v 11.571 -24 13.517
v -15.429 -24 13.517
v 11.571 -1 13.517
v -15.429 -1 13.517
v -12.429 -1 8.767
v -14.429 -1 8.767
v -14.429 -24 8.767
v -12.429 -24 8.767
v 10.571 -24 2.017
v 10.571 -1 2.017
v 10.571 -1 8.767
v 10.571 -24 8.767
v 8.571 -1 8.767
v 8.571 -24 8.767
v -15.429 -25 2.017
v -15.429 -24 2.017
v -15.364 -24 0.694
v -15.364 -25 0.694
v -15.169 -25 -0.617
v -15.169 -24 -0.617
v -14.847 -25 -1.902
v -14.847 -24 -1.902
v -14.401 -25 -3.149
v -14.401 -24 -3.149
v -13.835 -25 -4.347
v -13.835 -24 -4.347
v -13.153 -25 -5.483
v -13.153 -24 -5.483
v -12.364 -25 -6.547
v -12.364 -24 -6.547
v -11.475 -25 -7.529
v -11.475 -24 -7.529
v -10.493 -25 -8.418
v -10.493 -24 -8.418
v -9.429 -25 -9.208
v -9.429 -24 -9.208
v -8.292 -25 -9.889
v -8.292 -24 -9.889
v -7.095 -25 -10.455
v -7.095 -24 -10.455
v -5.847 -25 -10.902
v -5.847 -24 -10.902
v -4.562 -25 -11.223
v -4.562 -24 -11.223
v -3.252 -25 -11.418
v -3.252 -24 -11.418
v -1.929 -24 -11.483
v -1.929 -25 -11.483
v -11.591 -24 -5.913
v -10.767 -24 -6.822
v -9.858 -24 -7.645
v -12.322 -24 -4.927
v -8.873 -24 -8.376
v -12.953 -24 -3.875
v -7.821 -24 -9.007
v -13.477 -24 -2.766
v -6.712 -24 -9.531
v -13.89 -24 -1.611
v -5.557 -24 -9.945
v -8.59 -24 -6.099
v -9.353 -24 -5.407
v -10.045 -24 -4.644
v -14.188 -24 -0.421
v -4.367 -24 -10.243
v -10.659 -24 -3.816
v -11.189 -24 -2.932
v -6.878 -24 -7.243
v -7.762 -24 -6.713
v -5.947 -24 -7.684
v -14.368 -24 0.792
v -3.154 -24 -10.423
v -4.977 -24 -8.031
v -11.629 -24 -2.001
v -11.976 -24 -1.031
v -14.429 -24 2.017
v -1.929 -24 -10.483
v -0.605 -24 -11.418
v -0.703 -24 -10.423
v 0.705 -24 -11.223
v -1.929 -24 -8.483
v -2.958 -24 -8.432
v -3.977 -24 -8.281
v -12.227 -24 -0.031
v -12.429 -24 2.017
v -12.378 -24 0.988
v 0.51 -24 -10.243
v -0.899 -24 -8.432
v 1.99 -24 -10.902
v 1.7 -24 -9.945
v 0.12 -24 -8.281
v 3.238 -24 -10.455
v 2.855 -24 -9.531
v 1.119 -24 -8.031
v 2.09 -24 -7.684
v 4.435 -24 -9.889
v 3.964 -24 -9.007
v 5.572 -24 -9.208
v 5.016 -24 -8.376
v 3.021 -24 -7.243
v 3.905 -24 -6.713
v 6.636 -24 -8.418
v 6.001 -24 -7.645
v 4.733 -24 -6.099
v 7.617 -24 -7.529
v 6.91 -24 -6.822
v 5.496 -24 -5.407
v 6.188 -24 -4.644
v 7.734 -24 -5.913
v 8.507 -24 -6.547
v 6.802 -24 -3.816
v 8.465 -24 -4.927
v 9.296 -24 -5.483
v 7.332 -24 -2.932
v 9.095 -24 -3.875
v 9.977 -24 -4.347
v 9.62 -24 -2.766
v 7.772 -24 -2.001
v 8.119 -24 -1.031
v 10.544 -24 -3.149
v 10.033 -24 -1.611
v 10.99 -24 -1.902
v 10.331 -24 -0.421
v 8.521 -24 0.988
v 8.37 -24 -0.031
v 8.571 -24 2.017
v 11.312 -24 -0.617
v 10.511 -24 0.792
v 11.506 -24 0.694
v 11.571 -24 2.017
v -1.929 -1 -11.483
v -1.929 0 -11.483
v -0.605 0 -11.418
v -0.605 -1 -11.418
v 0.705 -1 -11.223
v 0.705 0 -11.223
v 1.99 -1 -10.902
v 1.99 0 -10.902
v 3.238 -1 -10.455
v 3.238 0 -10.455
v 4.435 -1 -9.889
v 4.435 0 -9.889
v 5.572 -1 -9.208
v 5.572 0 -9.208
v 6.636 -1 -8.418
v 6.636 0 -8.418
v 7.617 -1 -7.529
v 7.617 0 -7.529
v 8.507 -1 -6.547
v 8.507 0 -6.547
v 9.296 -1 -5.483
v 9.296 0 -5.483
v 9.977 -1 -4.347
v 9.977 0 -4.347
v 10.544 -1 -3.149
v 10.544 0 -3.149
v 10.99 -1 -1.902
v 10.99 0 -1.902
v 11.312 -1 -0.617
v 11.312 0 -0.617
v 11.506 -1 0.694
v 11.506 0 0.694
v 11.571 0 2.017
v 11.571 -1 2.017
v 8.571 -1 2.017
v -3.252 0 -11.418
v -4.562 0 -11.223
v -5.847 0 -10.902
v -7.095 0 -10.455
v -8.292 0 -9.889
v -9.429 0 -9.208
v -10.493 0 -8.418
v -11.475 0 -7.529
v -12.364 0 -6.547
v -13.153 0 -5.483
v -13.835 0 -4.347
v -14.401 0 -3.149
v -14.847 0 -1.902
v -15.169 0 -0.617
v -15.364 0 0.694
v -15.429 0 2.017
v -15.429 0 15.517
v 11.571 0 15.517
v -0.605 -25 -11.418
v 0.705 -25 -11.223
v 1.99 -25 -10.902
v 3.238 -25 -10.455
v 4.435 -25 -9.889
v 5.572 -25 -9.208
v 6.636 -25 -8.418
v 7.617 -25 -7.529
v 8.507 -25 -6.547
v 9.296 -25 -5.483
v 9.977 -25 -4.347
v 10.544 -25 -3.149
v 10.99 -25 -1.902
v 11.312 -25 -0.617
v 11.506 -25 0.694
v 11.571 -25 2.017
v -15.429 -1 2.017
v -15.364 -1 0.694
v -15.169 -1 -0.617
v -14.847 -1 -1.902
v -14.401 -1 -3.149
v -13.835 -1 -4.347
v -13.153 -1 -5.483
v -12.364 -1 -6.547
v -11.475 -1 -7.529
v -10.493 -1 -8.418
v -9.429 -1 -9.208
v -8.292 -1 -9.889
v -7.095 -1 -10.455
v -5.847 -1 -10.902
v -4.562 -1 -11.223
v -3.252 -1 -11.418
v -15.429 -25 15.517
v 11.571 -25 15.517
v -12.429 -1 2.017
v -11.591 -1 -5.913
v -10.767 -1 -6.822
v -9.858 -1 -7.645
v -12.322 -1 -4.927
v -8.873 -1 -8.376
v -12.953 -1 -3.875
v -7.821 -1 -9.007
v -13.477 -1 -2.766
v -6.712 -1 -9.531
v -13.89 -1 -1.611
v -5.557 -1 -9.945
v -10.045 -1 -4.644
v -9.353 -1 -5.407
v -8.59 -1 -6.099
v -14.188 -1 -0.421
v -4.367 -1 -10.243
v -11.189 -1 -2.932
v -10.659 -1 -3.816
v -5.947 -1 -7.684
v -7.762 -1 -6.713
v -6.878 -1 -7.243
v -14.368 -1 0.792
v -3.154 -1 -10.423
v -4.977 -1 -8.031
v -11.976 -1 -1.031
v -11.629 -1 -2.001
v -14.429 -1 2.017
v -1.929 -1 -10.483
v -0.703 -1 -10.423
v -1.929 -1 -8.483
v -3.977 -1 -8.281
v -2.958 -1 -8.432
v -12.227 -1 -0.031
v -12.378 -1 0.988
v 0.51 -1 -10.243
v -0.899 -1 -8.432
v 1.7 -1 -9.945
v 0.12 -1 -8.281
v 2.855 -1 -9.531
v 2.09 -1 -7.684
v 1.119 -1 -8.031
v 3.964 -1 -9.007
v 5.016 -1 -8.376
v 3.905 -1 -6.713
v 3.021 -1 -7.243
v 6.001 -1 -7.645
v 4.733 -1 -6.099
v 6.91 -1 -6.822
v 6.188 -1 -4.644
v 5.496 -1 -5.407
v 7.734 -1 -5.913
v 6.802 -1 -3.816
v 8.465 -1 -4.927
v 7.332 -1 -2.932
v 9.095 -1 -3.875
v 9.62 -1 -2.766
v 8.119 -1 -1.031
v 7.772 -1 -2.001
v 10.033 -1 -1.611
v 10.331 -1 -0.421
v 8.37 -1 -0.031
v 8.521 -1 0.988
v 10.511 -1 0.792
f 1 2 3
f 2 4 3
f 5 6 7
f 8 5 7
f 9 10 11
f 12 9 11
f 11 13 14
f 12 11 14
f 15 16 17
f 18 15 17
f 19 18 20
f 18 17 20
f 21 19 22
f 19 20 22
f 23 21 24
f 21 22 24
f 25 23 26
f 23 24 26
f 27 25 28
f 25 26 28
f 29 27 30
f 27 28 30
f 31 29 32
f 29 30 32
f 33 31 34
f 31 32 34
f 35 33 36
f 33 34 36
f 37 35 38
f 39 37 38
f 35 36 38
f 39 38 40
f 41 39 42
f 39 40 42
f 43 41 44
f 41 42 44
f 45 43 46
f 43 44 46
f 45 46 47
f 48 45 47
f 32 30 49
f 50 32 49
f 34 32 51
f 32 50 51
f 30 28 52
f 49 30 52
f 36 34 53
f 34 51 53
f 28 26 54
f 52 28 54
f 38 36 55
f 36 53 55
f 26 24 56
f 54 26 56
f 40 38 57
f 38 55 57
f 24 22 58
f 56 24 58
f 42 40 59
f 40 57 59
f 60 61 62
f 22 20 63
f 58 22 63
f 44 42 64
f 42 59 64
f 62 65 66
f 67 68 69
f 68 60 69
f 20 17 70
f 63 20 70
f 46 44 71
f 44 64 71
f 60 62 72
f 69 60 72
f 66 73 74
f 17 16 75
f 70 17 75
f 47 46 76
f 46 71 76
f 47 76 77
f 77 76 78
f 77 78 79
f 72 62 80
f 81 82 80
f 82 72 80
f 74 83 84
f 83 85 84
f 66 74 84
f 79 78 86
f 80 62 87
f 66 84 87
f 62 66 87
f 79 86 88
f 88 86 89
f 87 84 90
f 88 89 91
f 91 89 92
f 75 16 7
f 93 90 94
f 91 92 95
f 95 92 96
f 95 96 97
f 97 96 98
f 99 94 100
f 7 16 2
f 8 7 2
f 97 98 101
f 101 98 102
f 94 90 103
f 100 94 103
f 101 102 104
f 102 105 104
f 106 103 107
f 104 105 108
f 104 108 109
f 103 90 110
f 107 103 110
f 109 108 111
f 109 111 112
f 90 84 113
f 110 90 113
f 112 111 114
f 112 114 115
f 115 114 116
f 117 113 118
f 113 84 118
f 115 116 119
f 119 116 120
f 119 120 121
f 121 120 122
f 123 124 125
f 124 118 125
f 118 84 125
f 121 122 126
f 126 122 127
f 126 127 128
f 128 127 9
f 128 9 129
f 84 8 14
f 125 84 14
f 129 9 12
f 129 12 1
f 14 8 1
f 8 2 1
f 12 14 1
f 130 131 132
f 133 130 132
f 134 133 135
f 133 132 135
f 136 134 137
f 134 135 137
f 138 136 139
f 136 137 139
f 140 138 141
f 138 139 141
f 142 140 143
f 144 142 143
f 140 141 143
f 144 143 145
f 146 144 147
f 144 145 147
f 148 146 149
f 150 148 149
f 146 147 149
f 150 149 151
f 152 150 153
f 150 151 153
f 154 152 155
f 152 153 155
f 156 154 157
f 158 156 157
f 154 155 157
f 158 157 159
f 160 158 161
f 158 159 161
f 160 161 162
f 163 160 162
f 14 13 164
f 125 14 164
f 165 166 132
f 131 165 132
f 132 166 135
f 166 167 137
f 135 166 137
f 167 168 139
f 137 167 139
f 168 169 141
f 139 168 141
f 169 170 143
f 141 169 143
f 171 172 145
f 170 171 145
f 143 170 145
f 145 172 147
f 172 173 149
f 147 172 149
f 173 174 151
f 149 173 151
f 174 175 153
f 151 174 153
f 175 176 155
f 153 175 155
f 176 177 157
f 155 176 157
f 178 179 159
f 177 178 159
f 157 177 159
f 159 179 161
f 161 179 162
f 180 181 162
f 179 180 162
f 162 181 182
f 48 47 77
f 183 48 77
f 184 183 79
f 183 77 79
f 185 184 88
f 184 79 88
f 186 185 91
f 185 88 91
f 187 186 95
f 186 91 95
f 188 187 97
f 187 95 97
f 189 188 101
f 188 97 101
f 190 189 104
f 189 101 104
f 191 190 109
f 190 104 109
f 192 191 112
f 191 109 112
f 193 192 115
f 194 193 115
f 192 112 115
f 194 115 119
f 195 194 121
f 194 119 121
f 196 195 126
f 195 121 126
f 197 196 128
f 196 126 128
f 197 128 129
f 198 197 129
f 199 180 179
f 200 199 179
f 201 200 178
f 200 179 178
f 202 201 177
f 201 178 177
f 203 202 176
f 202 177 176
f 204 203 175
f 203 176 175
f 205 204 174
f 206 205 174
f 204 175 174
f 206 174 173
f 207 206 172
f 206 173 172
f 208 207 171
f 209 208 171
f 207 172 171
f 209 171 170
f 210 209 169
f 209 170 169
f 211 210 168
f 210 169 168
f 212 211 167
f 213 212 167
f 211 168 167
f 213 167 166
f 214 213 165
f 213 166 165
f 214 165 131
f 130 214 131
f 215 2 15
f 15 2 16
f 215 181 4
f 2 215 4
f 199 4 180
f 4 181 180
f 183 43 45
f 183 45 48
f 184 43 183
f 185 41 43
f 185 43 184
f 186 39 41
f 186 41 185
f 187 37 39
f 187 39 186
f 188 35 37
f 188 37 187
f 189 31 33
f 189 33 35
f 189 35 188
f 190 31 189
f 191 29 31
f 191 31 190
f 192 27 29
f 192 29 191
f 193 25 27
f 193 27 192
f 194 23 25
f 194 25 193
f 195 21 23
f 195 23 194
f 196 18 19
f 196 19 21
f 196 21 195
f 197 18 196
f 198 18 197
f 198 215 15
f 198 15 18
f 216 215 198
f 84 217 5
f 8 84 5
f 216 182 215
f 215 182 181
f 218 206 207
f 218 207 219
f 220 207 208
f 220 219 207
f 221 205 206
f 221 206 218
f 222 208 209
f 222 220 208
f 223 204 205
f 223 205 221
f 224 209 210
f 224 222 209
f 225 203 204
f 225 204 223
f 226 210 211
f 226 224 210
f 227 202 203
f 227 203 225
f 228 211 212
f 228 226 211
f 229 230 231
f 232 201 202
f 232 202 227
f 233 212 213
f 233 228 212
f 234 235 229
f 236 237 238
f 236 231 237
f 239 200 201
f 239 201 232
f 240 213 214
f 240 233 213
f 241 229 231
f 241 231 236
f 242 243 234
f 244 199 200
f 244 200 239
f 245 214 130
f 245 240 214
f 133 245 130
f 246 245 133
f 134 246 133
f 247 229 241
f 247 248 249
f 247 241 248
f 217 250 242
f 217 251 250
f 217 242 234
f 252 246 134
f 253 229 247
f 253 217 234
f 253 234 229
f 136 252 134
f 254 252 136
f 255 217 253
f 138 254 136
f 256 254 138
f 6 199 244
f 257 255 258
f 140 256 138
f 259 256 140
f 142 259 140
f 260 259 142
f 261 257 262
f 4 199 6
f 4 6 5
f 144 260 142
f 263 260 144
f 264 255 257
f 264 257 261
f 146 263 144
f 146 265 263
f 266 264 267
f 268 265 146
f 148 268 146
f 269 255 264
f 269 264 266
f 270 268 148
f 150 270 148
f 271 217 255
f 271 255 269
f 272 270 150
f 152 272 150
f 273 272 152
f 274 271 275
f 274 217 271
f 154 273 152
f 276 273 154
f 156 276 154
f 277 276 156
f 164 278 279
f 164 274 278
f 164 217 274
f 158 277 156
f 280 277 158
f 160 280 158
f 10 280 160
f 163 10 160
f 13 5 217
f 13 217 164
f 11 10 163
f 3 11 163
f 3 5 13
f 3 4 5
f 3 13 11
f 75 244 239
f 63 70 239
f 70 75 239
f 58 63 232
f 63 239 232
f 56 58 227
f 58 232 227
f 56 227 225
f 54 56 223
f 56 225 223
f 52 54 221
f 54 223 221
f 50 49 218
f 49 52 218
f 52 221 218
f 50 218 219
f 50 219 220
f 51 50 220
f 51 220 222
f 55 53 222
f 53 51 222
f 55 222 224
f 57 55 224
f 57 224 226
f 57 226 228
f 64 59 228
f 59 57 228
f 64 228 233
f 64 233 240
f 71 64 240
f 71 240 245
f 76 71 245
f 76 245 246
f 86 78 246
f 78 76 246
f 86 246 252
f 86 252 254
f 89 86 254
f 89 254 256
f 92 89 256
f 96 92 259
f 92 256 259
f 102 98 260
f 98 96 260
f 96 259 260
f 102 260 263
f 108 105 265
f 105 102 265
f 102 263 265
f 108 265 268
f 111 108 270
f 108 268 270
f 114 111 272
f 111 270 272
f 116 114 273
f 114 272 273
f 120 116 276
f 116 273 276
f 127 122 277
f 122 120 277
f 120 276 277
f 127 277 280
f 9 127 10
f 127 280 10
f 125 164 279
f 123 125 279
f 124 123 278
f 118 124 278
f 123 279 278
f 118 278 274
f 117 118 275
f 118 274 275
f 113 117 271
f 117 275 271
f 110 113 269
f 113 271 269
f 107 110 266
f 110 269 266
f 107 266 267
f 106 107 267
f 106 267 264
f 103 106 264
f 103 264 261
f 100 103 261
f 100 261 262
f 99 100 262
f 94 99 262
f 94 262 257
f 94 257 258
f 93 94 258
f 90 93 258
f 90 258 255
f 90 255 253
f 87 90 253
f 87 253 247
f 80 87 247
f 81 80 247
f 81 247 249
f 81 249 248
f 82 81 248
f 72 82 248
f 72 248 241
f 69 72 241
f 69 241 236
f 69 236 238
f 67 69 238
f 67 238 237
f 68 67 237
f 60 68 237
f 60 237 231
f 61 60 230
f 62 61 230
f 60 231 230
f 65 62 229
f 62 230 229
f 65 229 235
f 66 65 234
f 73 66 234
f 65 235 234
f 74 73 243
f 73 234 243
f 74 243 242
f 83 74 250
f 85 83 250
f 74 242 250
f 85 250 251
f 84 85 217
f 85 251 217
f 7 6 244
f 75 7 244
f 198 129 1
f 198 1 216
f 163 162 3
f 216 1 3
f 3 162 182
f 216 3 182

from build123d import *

# Parameters (mm, degrees)
F0_W     = 2
F0_H     = 2
F0_W_2   = 1
F0_W_3   = 21
F1_DEPTH = 25
F2_DEPTH = 1
F3_START = 24
F3_DEPTH = 1
F4_W     = 23
F4_H     = 4.75
F5_DEPTH = 25


with BuildPart() as f1:
    # F0 (on Front) → F1 (new body)
    with BuildSketch(Plane.XZ):
        with BuildLine():
            Line((-12.4285714286, 13.5171716937), (-14.4285714286, 13.5171716937))
            Line((-14.4285714286, 13.5171716937), (-14.4285714286, 2.0171716937))
            ThreePointArc((-14.4285714286, 2.0171716937), (-1.9285714286, -10.4828283063), (10.5714285714, 2.0171716937))
            Line((10.5714285714, 2.0171716937), (10.5714285714, 13.5171716937))
            Line((10.5714285714, 13.5171716937), (8.5714285714, 13.5171716937))
            Line((8.5714285714, 13.5171716937), (8.5714285714, 2.0171716937))
            ThreePointArc((8.5714285714, 2.0171716937), (-1.9285714286, -8.4828283063), (-12.4285714286, 2.0171716937))
            Line((-12.4285714286, 2.0171716937), (-12.4285714286, 13.5171716937))
        make_face()
        with Locations((9.5714285714, 14.5171716937)):
            Rectangle(F0_W, F0_H)
        with Locations((-13.4285714286, 14.5171716937)):
            Rectangle(F0_W, F0_H)
        with Locations((-14.9285714286, 14.5171716937)):
            Rectangle(F0_W_2, F0_H)
        with Locations((-1.9285714286, 14.5171716937)):
            Rectangle(F0_W_3, F0_H)
        with Locations((11.0714285714, 14.5171716937)):
            Rectangle(F0_W_2, F0_H)
    extrude(amount=F1_DEPTH)

    # F0 (on Front) → F2 (join)
    with BuildSketch(Plane.XZ):
        with BuildLine():
            Line((-14.4285714286, 13.5171716937), (-15.4285714286, 13.5171716937))
            Line((-15.4285714286, 13.5171716937), (-15.4285714286, 2.0171716937))
            ThreePointArc((-15.4285714286, 2.0171716937), (-11.4745129746, -7.5287698523), (-1.9285714286, -11.4828283063))
            ThreePointArc((-1.9285714286, -11.4828283063), (7.6173701174, -7.5287698523), (11.5714285714, 2.0171716937))
            Line((11.5714285714, 2.0171716937), (11.5714285714, 13.5171716937))
            Line((11.5714285714, 13.5171716937), (10.5714285714, 13.5171716937))
            Line((10.5714285714, 13.5171716937), (10.5714285714, 2.0171716937))
            ThreePointArc((10.5714285714, 2.0171716937), (-1.9285714286, -10.4828283063), (-14.4285714286, 2.0171716937))
            Line((-14.4285714286, 2.0171716937), (-14.4285714286, 13.5171716937))
        make_face()
        with BuildLine():
            Line((-12.4285714286, 13.5171716937), (-14.4285714286, 13.5171716937))
            Line((-14.4285714286, 13.5171716937), (-14.4285714286, 2.0171716937))
            ThreePointArc((-14.4285714286, 2.0171716937), (-1.9285714286, -10.4828283063), (10.5714285714, 2.0171716937))
            Line((10.5714285714, 2.0171716937), (10.5714285714, 13.5171716937))
            Line((10.5714285714, 13.5171716937), (8.5714285714, 13.5171716937))
            Line((8.5714285714, 13.5171716937), (8.5714285714, 2.0171716937))
            ThreePointArc((8.5714285714, 2.0171716937), (-1.9285714286, -8.4828283063), (-12.4285714286, 2.0171716937))
            Line((-12.4285714286, 2.0171716937), (-12.4285714286, 13.5171716937))
        make_face()
        with BuildLine():
            Line((8.5714285714, 13.5171716937), (-12.4285714286, 13.5171716937))
            Line((-12.4285714286, 13.5171716937), (-12.4285714286, 2.0171716937))
            ThreePointArc((-12.4285714286, 2.0171716937), (-1.9285714286, -8.4828283063), (8.5714285714, 2.0171716937))
            Line((8.5714285714, 2.0171716937), (8.5714285714, 13.5171716937))
        make_face()
    extrude(amount=F2_DEPTH)

    # F0 (on Front) → F3 (join)
    with BuildSketch(Plane.XZ.offset(F3_START)):
        with BuildLine():
            Line((-14.4285714286, 13.5171716937), (-15.4285714286, 13.5171716937))
            Line((-15.4285714286, 13.5171716937), (-15.4285714286, 2.0171716937))
            ThreePointArc((-15.4285714286, 2.0171716937), (-11.4745129746, -7.5287698523), (-1.9285714286, -11.4828283063))
            ThreePointArc((-1.9285714286, -11.4828283063), (7.6173701174, -7.5287698523), (11.5714285714, 2.0171716937))
            Line((11.5714285714, 2.0171716937), (11.5714285714, 13.5171716937))
            Line((11.5714285714, 13.5171716937), (10.5714285714, 13.5171716937))
            Line((10.5714285714, 13.5171716937), (10.5714285714, 2.0171716937))
            ThreePointArc((10.5714285714, 2.0171716937), (-1.9285714286, -10.4828283063), (-14.4285714286, 2.0171716937))
            Line((-14.4285714286, 2.0171716937), (-14.4285714286, 13.5171716937))
        make_face()
        with BuildLine():
            Line((-12.4285714286, 13.5171716937), (-14.4285714286, 13.5171716937))
            Line((-14.4285714286, 13.5171716937), (-14.4285714286, 2.0171716937))
            ThreePointArc((-14.4285714286, 2.0171716937), (-1.9285714286, -10.4828283063), (10.5714285714, 2.0171716937))
            Line((10.5714285714, 2.0171716937), (10.5714285714, 13.5171716937))
            Line((10.5714285714, 13.5171716937), (8.5714285714, 13.5171716937))
            Line((8.5714285714, 13.5171716937), (8.5714285714, 2.0171716937))
            ThreePointArc((8.5714285714, 2.0171716937), (-1.9285714286, -8.4828283063), (-12.4285714286, 2.0171716937))
            Line((-12.4285714286, 2.0171716937), (-12.4285714286, 13.5171716937))
        make_face()
        with BuildLine():
            Line((8.5714285714, 13.5171716937), (-12.4285714286, 13.5171716937))
            Line((-12.4285714286, 13.5171716937), (-12.4285714286, 2.0171716937))
            ThreePointArc((-12.4285714286, 2.0171716937), (-1.9285714286, -8.4828283063), (8.5714285714, 2.0171716937))
            Line((8.5714285714, 2.0171716937), (8.5714285714, 13.5171716937))
        make_face()
    extrude(amount=F3_DEPTH)

    # F4 (on face) → F5 (cut, through all)
    with BuildSketch(Plane(origin=(-14.4285714286, 0, 0), x_dir=(0, -1, 0), z_dir=(-1, 0, 0))):
        with Locations((12.5, 11.1421716937)):
            Rectangle(F4_W, F4_H)
    extrude(amount=-F5_DEPTH, mode=Mode.SUBTRACT)


solid = f1.part
